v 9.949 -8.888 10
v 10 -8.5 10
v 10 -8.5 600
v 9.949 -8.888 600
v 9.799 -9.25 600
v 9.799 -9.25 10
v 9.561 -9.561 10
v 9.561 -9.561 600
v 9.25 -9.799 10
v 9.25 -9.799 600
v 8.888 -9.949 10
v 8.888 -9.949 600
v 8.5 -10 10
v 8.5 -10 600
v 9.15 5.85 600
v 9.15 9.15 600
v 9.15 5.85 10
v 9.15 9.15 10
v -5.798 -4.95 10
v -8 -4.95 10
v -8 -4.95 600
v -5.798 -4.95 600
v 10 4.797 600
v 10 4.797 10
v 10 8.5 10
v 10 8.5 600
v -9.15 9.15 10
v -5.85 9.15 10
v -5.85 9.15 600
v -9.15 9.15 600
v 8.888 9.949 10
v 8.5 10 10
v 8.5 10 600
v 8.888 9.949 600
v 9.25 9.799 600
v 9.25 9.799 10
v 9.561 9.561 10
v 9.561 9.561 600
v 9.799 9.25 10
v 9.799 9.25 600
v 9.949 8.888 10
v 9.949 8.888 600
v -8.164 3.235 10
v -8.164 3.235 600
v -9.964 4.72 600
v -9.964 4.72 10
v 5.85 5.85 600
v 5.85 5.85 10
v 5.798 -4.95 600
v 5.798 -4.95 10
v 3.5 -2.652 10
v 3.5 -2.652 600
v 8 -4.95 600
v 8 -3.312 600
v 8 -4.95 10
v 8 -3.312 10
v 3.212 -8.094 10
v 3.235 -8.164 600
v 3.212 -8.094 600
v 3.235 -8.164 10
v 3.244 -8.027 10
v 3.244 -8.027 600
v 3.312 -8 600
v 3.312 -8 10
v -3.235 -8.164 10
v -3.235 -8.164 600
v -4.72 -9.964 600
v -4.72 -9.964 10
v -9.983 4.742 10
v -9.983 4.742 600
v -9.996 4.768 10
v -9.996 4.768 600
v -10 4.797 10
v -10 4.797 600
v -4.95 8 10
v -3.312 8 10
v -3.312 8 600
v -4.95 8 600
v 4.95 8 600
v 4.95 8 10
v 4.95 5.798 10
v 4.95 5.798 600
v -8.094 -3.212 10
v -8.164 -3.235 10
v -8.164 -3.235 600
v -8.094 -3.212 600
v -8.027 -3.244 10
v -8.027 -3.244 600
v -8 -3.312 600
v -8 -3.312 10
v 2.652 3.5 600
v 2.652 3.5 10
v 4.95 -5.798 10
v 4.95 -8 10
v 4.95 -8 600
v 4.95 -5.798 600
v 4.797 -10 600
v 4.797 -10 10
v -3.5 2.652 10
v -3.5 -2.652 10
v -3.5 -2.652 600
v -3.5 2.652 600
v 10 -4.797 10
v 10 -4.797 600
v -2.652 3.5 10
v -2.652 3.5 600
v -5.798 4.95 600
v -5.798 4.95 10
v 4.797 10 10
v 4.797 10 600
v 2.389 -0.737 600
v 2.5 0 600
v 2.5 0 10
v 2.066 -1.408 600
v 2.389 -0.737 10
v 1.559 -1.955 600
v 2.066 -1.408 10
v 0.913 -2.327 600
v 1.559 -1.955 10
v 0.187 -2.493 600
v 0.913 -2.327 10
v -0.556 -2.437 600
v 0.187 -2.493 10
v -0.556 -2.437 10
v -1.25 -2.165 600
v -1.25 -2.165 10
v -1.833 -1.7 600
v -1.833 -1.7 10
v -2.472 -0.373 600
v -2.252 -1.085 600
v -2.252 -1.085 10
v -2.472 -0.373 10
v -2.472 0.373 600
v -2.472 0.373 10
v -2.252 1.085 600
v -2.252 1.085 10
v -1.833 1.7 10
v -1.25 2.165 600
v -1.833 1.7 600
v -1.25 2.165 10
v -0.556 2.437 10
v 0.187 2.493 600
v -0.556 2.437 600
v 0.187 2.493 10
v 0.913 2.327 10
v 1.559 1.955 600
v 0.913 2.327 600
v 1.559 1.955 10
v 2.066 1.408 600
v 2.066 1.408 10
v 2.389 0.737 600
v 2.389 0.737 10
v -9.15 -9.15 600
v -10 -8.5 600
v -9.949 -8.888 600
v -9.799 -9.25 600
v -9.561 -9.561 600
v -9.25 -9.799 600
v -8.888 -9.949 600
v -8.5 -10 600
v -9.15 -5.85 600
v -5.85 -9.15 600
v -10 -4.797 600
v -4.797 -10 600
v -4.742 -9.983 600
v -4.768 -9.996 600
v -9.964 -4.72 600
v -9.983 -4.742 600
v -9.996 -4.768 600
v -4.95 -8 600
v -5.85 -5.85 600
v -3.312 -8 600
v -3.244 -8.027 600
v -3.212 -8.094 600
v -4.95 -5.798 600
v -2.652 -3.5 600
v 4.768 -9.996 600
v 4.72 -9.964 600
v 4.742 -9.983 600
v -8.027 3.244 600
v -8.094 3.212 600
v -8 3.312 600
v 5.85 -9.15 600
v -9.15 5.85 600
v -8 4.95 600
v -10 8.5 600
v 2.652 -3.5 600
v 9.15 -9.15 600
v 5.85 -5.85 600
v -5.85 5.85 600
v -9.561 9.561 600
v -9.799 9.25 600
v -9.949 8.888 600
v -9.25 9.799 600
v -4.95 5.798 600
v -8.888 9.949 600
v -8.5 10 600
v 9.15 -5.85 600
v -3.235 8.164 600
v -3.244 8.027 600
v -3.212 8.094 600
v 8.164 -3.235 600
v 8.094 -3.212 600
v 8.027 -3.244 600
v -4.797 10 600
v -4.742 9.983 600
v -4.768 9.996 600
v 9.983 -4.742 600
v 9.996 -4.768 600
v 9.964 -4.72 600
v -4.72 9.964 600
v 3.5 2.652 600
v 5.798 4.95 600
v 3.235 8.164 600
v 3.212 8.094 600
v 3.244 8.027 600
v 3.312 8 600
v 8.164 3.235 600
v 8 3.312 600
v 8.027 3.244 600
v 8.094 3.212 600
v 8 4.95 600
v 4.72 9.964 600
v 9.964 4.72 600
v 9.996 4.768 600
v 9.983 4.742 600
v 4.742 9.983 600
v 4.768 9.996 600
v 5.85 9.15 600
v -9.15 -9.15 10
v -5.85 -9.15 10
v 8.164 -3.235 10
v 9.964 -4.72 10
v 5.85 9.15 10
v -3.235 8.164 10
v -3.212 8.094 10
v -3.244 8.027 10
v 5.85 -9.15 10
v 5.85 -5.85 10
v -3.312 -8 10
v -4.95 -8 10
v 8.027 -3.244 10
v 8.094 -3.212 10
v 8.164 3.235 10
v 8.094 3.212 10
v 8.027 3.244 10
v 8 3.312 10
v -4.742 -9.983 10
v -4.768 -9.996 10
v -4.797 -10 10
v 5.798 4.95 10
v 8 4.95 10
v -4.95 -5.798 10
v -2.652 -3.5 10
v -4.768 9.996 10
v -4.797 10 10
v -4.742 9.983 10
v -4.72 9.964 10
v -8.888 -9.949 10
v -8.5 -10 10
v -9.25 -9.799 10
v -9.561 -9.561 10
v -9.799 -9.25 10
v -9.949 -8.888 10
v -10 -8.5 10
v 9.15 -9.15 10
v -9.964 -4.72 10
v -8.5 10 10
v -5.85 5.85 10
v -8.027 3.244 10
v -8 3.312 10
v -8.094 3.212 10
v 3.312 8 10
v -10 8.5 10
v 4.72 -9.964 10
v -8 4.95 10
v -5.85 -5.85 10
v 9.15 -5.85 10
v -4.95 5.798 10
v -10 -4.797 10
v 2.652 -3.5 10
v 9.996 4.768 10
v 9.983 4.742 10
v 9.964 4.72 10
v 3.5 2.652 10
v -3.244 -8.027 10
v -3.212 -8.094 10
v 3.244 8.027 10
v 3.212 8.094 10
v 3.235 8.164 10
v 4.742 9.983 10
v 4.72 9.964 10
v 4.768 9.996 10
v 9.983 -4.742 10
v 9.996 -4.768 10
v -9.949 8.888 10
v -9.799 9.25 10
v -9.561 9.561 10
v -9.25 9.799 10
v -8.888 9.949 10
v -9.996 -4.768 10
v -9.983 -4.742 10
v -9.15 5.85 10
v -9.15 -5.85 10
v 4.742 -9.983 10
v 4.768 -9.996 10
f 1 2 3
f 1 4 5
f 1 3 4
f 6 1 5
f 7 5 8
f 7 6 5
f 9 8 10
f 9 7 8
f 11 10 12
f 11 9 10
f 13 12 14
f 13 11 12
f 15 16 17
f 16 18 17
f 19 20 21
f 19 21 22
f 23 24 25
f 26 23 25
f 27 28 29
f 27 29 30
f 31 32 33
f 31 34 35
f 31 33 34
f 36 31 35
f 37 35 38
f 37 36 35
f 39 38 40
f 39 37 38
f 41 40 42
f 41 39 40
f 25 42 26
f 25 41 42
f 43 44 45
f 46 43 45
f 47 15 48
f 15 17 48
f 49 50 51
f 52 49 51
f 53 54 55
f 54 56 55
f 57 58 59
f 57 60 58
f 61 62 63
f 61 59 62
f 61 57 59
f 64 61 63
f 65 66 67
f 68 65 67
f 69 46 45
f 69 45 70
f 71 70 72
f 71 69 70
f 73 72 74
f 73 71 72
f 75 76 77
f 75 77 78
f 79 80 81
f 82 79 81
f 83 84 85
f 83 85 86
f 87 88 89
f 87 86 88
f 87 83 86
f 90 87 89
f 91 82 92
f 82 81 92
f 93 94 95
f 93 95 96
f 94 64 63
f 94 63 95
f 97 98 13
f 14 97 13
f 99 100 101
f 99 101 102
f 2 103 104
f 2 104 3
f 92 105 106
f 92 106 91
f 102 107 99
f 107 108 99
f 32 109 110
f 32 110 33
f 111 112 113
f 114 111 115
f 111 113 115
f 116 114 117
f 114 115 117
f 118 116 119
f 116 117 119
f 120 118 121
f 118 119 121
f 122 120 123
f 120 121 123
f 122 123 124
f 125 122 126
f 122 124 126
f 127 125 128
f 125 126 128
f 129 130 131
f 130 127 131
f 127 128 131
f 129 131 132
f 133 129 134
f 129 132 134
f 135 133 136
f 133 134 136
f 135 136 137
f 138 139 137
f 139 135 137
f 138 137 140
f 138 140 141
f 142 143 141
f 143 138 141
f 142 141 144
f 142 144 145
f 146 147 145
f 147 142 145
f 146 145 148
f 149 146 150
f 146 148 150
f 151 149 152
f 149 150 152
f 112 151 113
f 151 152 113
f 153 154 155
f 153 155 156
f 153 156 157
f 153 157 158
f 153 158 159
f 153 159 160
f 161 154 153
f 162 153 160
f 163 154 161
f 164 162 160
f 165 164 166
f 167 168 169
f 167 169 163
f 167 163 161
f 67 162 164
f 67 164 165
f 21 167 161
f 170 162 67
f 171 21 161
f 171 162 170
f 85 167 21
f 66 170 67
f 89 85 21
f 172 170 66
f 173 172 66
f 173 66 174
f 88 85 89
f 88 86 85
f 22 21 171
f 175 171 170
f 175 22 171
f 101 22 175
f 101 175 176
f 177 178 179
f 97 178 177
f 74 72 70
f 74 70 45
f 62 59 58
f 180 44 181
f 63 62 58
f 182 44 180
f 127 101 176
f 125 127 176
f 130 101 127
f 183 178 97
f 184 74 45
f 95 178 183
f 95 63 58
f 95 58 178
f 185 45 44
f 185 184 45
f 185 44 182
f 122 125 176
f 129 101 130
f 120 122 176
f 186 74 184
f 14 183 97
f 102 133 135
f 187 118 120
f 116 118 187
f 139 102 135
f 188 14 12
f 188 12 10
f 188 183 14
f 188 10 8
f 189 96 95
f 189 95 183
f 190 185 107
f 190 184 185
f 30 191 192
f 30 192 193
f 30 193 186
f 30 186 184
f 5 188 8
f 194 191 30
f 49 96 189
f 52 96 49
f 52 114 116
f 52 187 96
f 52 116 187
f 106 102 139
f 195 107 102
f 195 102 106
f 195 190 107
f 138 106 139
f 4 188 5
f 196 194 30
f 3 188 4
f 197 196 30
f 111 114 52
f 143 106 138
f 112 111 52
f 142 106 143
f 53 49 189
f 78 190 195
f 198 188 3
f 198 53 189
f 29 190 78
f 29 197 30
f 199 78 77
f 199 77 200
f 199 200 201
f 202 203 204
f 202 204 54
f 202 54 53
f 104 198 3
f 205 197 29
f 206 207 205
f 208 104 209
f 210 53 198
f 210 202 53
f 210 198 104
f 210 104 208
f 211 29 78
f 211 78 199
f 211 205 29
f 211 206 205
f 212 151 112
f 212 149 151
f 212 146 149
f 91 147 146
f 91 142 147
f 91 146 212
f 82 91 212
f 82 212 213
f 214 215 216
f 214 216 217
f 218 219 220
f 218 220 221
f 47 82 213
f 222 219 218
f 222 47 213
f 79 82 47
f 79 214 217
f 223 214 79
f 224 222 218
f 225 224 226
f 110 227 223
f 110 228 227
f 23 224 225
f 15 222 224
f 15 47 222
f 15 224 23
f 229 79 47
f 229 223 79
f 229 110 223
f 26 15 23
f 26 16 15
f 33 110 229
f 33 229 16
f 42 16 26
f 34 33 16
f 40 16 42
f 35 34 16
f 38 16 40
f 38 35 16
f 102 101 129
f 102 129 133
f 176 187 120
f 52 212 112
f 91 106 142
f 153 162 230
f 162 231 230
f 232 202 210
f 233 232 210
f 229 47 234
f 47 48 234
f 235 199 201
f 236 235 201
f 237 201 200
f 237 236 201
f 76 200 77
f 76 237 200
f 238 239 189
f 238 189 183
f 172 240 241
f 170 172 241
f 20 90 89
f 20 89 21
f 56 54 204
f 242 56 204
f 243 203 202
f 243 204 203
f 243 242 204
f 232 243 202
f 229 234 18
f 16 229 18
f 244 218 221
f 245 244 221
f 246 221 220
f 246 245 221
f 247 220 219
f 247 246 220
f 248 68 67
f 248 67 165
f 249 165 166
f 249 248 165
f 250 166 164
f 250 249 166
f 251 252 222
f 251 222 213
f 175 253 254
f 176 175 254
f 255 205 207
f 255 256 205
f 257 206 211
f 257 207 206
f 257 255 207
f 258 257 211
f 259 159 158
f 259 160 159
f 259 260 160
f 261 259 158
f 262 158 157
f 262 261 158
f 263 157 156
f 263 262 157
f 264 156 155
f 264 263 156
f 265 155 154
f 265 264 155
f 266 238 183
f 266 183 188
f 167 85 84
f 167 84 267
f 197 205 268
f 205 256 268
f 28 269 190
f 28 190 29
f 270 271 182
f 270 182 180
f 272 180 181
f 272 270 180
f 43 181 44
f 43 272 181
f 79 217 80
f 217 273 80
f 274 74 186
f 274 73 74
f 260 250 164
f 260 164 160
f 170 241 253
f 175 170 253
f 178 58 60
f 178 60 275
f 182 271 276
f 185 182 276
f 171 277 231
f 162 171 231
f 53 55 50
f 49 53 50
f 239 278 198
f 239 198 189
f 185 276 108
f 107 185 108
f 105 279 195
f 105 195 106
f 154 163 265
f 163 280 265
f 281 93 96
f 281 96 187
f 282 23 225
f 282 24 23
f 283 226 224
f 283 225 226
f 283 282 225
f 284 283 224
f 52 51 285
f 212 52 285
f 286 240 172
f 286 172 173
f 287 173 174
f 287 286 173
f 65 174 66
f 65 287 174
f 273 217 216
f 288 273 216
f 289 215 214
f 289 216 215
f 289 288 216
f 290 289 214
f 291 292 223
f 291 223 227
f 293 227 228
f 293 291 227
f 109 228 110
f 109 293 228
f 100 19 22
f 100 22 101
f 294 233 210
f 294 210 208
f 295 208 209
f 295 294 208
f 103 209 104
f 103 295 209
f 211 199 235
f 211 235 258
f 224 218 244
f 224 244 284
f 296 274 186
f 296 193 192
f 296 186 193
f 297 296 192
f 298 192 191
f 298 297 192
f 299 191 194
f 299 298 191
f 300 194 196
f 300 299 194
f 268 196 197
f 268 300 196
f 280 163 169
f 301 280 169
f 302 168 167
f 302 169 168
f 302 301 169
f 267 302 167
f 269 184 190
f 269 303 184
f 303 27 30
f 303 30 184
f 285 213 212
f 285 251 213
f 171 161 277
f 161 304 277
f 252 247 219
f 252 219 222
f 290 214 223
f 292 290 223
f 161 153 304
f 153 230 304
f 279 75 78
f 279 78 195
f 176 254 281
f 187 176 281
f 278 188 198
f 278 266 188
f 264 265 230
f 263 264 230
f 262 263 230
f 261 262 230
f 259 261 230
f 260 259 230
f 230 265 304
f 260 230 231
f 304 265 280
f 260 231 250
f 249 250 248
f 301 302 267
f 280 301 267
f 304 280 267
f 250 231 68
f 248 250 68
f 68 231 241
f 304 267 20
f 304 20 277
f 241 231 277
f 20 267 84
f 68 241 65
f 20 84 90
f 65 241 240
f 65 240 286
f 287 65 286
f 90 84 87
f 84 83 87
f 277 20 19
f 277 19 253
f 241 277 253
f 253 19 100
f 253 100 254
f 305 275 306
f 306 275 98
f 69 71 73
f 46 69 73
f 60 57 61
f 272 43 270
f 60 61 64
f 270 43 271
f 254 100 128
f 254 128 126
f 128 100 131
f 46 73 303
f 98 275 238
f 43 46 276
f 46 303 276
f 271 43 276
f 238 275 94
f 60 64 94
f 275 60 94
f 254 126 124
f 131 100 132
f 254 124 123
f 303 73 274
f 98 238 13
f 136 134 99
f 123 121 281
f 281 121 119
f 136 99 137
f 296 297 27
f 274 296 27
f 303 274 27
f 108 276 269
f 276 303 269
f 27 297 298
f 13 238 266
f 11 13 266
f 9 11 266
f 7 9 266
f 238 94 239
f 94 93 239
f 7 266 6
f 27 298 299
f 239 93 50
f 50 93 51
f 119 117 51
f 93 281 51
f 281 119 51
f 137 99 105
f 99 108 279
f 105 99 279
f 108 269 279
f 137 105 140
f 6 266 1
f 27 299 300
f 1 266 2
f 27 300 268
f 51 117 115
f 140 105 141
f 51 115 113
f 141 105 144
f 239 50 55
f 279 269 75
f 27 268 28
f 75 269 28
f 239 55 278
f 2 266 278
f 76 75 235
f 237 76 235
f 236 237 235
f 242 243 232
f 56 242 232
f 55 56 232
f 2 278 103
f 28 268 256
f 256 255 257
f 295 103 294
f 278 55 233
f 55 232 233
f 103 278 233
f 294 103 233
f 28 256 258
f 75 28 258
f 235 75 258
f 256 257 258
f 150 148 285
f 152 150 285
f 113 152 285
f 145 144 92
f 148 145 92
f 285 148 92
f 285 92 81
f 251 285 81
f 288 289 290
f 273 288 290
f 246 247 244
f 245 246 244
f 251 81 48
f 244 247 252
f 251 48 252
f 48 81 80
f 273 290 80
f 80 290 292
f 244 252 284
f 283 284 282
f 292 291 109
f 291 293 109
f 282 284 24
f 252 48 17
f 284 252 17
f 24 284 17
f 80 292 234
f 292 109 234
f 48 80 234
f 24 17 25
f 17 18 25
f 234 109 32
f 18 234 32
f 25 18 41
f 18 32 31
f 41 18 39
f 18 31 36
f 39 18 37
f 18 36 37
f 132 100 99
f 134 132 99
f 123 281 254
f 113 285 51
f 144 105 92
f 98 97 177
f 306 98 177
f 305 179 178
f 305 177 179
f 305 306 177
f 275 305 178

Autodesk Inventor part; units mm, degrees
ref_plane "Начальная плоскость" through (0, 0, 10) normal (0, 0, 1) x (1, 0, 0)
ref_plane "Конечная плоскость" through (0, 0, 600) normal (0, 0, 1) x (1, 0, 0)
sketch "Эскиз" plane through (0, 0, 0) normal (0, 0, 1) x (1, 0, 0)
  line L0 (-14.4349, 0) -> (14.4349, 0) projected
  line L1 (0, -14) -> (0, 14) projected
  line L2 (0, 0) -> (7.5, 7.5) construction
  circle A0 centre (7.5, 7.5) radius 1.65 construction
  line L3 (5.85, 9.15) -> (9.15, 9.15)
  line L4 (9.15, 9.15) -> (9.15, 5.85)
  line L5 (9.15, 5.85) -> (5.85, 5.85)
  line L6 (5.85, 5.85) -> (5.85, 9.15)
  line L7 (3.235, 8.1636) -> (4.72, 9.9636)
  line L8 (4.7971, 10) -> (8.5, 10)
  line L9 (3.3121, 8) -> (4.95, 8)
  line L10 (4.95, 8) -> (4.95, 5.7985)
  line L11 (4.95, 5.7985) -> (2.6515, 3.5)
  line L12 (0, 3.5) -> (2.6515, 3.5)
  circle A1 centre (0, 0) radius 2.5
  line L13 (8.1636, 3.235) -> (9.9636, 4.72)
  line L14 (10, 4.7971) -> (10, 8.5)
  line L15 (8, 3.3121) -> (8, 4.95)
  line L16 (8, 4.95) -> (5.7985, 4.95)
  line L17 (5.7985, 4.95) -> (3.5, 2.6515)
  line L18 (3.5, 0) -> (3.5, 2.6515)
  arc A2 (10, 8.5) -> (8.5, 10) centre (8.5, 8.5) ccw
  line L19 (0, 0) -> (-7.5, 7.5) construction
  circle A3 centre (-7.5, 7.5) radius 1.65 construction
  line L20 (-5.85, 9.15) -> (-9.15, 9.15)
  line L21 (-9.15, 9.15) -> (-9.15, 5.85)
  line L22 (-9.15, 5.85) -> (-5.85, 5.85)
  line L23 (-5.85, 5.85) -> (-5.85, 9.15)
  line L24 (-3.235, 8.1636) -> (-4.72, 9.9636)
  line L25 (-4.7971, 10) -> (-8.5, 10)
  line L26 (-3.3121, 8) -> (-4.95, 8)
  line L27 (-4.95, 8) -> (-4.95, 5.7985)
  line L28 (-4.95, 5.7985) -> (-2.6515, 3.5)
  line L29 (0, 3.5) -> (-2.6515, 3.5)
  line L30 (-3.5, 0) -> (-3.5, 2.6515)
  line L31 (-5.7985, 4.95) -> (-3.5, 2.6515)
  line L32 (-8, 4.95) -> (-5.7985, 4.95)
  line L33 (-8, 3.3121) -> (-8, 4.95)
  line L34 (-8.1636, 3.235) -> (-9.9636, 4.72)
  line L35 (-10, 4.7971) -> (-10, 8.5)
  arc A4 (-8.5, 10) -> (-10, 8.5) centre (-8.5, 8.5) ccw
  line L36 (0, 14) -> (0, -14)
  line L37 (0, 0) -> (7.5, -7.5) construction
  circle A5 centre (7.5, -7.5) radius 1.65 construction
  line L38 (5.85, -9.15) -> (9.15, -9.15)
  line L39 (9.15, -9.15) -> (9.15, -5.85)
  line L40 (9.15, -5.85) -> (5.85, -5.85)
  line L41 (5.85, -5.85) -> (5.85, -9.15)
  line L42 (3.235, -8.1636) -> (4.72, -9.9636)
  line L43 (4.7971, -10) -> (8.5, -10)
  line L44 (3.3121, -8) -> (4.95, -8)
  line L45 (4.95, -8) -> (4.95, -5.7985)
  line L46 (4.95, -5.7985) -> (2.6515, -3.5)
  line L47 (0, -3.5) -> (2.6515, -3.5)
  line L48 (3.5, 0) -> (3.5, -2.6515)
  line L49 (5.7985, -4.95) -> (3.5, -2.6515)
  line L50 (8, -4.95) -> (5.7985, -4.95)
  line L51 (8, -3.3121) -> (8, -4.95)
  line L52 (8.1636, -3.235) -> (9.9636, -4.72)
  line L53 (10, -4.7971) -> (10, -8.5)
  arc A6 (8.5, -10) -> (10, -8.5) centre (8.5, -8.5) ccw
  line L54 (0, 0) -> (-7.5, -7.5) construction
  line L55 (-4.95, -8) -> (-4.95, -5.7985)
  line L56 (-3.3121, -8) -> (-4.95, -8)
  line L57 (-5.7985, -4.95) -> (-3.5, -2.6515)
  line L58 (-4.95, -5.7985) -> (-2.6515, -3.5)
  line L59 (-3.5, 0) -> (-3.5, -2.6515)
  line L60 (0, -3.5) -> (-2.6515, -3.5)
  circle A7 centre (-7.5, -7.5) radius 1.65 construction
  line L61 (-5.85, -5.85) -> (-5.85, -9.15)
  line L62 (-5.85, -9.15) -> (-9.15, -9.15)
  line L63 (-9.15, -9.15) -> (-9.15, -5.85)
  line L64 (-9.15, -5.85) -> (-5.85, -5.85)
  line L65 (-3.235, -8.1636) -> (-4.72, -9.9636)
  line L66 (-8, -4.95) -> (-5.7985, -4.95)
  line L67 (-8, -3.3121) -> (-8, -4.95)
  line L68 (-8.1636, -3.235) -> (-9.9636, -4.72)
  line L69 (-4.7971, -10) -> (-8.5, -10)
  line L70 (-10, -4.7971) -> (-10, -8.5)
  arc A8 (-10, -8.5) -> (-8.5, -10) centre (-8.5, -8.5) ccw
  arc A9 (3.235, 8.1636) -> (3.3121, 8) centre (3.3121, 8.1) ccw
  arc A10 (4.7971, 10) -> (4.72, 9.9636) centre (4.7971, 9.9) ccw
  arc A11 (8, 3.3121) -> (8.1636, 3.235) centre (8.1, 3.3121) ccw
  arc A12 (9.9636, 4.72) -> (10, 4.7971) centre (9.9, 4.7971) ccw
  arc A13 (-3.3121, 8) -> (-3.235, 8.1636) centre (-3.3121, 8.1) ccw
  arc A14 (-4.72, 9.9636) -> (-4.7971, 10) centre (-4.7971, 9.9) ccw
  arc A15 (-8.1636, 3.235) -> (-8, 3.3121) centre (-8.1, 3.3121) ccw
  arc A16 (-10, 4.7971) -> (-9.9636, 4.72) centre (-9.9, 4.7971) ccw
  arc A17 (-8, -3.3121) -> (-8.1636, -3.235) centre (-8.1, -3.3121) ccw
  arc A18 (-9.9636, -4.72) -> (-10, -4.7971) centre (-9.9, -4.7971) ccw
  arc A19 (-3.235, -8.1636) -> (-3.3121, -8) centre (-3.3121, -8.1) ccw
  arc A20 (-4.7971, -10) -> (-4.72, -9.9636) centre (-4.7971, -9.9) ccw
  arc A21 (4.72, -9.9636) -> (4.7971, -10) centre (4.7971, -9.9) ccw
  arc A22 (3.3121, -8) -> (3.235, -8.1636) centre (3.3121, -8.1) ccw
  arc A23 (8.1636, -3.235) -> (8, -3.3121) centre (8.1, -3.3121) ccw
  arc A24 (10, -4.7971) -> (9.9636, -4.72) centre (9.9, -4.7971) ccw
  point P0 (3.1, 8)
  point P1 (4.75, 10)
  point P2 (7.5, 9.15)
  point P3 (8, 3.1)
  point P4 (10, 4.75)
  point P5 (7.5, 5.85)
  point P6 (9.15, 7.5)
  point P7 (-3.1, 8)
  point P8 (-4.75, 10)
  point P9 (-7.5, 9.15)
  point P10 (-8, 3.1)
  point P11 (-10, 4.75)
  point P12 (-7.5, 5.85)
  point P13 (-9.15, 7.5)
  point P14 (3.1, -8)
  point P15 (4.75, -10)
  point P16 (7.5, -9.15)
  point P17 (8, -3.1)
  point P18 (10, -4.75)
  point P19 (7.5, -5.85)
  point P20 (9.15, -7.5)
  point P21 (-3.1, -8)
  point P22 (-7.5, -5.85)
  point P23 (-7.5, -9.15)
  point P24 (-9.15, -7.5)
  point P25 (-4.75, -10)
  point P26 (-8, -3.1)
  point P27 (-10, -4.75)
  dimension "d0" = 45
  dimension "d1" = 3.3
  dimension "d2" = 1.5
  dimension "d3" = 1.2
  dimension "d4" = 5
  dimension "d5" = 6.5
  dimension "d6" = 15
  dimension "d7" = 20
  dimension "d8" = 9.9
  dimension "d9" = 9.5
  dimension "d10" = 6.2
  dimension "d11" = 2
  dimension "d18" = 0.1
  dimension "d19" = 0.1
extrude "Тело" add sketch "Эскиз" along normal up to surface (590 mm away) from surface at 10 contours A1 L1 L12 L11 L10 L9 A9 L7 A10 L8 A2 L14 A12 L13 A11 L15 L16 L17 L18 L0 | L0 L48 L49 L50 L51 A23 L52 A24 L53 A6 L43 A21 L42 A22 L44 L45 L46 L47 L1 A1 | A1 L0 L30 L31 L32 L33 A15 L34 A16 L35 A4 L25 A14 L24 A13 L26 L27 L28 L29 L1 | L1 L60 L58 L55 L56 A19 L65 A20 L69 A8 L70 A18 L68 A17 L67 L66 L57 L59 L0 A1
sketch "Эскиз2" plane through (0, 0, 0) normal (0, 0, 1) x (1, 0, 0)
  line L0 (0, 0) -> (10, 0)
ref_plane "РабПлоскость3" through (0, 0, 0) normal (0, -1, 0) x (1, 0, 0)
sketch "Эскиз3" plane through (0, 0, 0) normal (0, -1, 0) x (1, 0, 0)
  line L0 (-2, 10) -> (12, 10)
  line L1 (-2, 600) -> (12, 600)
  dimension "d25" = 590
ref_plane "РабПлоскость4" through (0, -300, 10) normal (0, 0, -1) x (-1, 0, 0)
split "Разделение1" plane through (0, -300, 10) removes the side toward (0, 0, -1)
ref_plane "РабПлоскость5" through (50, 0, 10) normal (0, 0, -1) x (-1, 0, 0)
split "Разделение2" plane through (50, 0, 10) removes the side toward (0, 0, -1)
equation "\"G_OFFSET_END\" = 0"
properties part number "короткая палка"
